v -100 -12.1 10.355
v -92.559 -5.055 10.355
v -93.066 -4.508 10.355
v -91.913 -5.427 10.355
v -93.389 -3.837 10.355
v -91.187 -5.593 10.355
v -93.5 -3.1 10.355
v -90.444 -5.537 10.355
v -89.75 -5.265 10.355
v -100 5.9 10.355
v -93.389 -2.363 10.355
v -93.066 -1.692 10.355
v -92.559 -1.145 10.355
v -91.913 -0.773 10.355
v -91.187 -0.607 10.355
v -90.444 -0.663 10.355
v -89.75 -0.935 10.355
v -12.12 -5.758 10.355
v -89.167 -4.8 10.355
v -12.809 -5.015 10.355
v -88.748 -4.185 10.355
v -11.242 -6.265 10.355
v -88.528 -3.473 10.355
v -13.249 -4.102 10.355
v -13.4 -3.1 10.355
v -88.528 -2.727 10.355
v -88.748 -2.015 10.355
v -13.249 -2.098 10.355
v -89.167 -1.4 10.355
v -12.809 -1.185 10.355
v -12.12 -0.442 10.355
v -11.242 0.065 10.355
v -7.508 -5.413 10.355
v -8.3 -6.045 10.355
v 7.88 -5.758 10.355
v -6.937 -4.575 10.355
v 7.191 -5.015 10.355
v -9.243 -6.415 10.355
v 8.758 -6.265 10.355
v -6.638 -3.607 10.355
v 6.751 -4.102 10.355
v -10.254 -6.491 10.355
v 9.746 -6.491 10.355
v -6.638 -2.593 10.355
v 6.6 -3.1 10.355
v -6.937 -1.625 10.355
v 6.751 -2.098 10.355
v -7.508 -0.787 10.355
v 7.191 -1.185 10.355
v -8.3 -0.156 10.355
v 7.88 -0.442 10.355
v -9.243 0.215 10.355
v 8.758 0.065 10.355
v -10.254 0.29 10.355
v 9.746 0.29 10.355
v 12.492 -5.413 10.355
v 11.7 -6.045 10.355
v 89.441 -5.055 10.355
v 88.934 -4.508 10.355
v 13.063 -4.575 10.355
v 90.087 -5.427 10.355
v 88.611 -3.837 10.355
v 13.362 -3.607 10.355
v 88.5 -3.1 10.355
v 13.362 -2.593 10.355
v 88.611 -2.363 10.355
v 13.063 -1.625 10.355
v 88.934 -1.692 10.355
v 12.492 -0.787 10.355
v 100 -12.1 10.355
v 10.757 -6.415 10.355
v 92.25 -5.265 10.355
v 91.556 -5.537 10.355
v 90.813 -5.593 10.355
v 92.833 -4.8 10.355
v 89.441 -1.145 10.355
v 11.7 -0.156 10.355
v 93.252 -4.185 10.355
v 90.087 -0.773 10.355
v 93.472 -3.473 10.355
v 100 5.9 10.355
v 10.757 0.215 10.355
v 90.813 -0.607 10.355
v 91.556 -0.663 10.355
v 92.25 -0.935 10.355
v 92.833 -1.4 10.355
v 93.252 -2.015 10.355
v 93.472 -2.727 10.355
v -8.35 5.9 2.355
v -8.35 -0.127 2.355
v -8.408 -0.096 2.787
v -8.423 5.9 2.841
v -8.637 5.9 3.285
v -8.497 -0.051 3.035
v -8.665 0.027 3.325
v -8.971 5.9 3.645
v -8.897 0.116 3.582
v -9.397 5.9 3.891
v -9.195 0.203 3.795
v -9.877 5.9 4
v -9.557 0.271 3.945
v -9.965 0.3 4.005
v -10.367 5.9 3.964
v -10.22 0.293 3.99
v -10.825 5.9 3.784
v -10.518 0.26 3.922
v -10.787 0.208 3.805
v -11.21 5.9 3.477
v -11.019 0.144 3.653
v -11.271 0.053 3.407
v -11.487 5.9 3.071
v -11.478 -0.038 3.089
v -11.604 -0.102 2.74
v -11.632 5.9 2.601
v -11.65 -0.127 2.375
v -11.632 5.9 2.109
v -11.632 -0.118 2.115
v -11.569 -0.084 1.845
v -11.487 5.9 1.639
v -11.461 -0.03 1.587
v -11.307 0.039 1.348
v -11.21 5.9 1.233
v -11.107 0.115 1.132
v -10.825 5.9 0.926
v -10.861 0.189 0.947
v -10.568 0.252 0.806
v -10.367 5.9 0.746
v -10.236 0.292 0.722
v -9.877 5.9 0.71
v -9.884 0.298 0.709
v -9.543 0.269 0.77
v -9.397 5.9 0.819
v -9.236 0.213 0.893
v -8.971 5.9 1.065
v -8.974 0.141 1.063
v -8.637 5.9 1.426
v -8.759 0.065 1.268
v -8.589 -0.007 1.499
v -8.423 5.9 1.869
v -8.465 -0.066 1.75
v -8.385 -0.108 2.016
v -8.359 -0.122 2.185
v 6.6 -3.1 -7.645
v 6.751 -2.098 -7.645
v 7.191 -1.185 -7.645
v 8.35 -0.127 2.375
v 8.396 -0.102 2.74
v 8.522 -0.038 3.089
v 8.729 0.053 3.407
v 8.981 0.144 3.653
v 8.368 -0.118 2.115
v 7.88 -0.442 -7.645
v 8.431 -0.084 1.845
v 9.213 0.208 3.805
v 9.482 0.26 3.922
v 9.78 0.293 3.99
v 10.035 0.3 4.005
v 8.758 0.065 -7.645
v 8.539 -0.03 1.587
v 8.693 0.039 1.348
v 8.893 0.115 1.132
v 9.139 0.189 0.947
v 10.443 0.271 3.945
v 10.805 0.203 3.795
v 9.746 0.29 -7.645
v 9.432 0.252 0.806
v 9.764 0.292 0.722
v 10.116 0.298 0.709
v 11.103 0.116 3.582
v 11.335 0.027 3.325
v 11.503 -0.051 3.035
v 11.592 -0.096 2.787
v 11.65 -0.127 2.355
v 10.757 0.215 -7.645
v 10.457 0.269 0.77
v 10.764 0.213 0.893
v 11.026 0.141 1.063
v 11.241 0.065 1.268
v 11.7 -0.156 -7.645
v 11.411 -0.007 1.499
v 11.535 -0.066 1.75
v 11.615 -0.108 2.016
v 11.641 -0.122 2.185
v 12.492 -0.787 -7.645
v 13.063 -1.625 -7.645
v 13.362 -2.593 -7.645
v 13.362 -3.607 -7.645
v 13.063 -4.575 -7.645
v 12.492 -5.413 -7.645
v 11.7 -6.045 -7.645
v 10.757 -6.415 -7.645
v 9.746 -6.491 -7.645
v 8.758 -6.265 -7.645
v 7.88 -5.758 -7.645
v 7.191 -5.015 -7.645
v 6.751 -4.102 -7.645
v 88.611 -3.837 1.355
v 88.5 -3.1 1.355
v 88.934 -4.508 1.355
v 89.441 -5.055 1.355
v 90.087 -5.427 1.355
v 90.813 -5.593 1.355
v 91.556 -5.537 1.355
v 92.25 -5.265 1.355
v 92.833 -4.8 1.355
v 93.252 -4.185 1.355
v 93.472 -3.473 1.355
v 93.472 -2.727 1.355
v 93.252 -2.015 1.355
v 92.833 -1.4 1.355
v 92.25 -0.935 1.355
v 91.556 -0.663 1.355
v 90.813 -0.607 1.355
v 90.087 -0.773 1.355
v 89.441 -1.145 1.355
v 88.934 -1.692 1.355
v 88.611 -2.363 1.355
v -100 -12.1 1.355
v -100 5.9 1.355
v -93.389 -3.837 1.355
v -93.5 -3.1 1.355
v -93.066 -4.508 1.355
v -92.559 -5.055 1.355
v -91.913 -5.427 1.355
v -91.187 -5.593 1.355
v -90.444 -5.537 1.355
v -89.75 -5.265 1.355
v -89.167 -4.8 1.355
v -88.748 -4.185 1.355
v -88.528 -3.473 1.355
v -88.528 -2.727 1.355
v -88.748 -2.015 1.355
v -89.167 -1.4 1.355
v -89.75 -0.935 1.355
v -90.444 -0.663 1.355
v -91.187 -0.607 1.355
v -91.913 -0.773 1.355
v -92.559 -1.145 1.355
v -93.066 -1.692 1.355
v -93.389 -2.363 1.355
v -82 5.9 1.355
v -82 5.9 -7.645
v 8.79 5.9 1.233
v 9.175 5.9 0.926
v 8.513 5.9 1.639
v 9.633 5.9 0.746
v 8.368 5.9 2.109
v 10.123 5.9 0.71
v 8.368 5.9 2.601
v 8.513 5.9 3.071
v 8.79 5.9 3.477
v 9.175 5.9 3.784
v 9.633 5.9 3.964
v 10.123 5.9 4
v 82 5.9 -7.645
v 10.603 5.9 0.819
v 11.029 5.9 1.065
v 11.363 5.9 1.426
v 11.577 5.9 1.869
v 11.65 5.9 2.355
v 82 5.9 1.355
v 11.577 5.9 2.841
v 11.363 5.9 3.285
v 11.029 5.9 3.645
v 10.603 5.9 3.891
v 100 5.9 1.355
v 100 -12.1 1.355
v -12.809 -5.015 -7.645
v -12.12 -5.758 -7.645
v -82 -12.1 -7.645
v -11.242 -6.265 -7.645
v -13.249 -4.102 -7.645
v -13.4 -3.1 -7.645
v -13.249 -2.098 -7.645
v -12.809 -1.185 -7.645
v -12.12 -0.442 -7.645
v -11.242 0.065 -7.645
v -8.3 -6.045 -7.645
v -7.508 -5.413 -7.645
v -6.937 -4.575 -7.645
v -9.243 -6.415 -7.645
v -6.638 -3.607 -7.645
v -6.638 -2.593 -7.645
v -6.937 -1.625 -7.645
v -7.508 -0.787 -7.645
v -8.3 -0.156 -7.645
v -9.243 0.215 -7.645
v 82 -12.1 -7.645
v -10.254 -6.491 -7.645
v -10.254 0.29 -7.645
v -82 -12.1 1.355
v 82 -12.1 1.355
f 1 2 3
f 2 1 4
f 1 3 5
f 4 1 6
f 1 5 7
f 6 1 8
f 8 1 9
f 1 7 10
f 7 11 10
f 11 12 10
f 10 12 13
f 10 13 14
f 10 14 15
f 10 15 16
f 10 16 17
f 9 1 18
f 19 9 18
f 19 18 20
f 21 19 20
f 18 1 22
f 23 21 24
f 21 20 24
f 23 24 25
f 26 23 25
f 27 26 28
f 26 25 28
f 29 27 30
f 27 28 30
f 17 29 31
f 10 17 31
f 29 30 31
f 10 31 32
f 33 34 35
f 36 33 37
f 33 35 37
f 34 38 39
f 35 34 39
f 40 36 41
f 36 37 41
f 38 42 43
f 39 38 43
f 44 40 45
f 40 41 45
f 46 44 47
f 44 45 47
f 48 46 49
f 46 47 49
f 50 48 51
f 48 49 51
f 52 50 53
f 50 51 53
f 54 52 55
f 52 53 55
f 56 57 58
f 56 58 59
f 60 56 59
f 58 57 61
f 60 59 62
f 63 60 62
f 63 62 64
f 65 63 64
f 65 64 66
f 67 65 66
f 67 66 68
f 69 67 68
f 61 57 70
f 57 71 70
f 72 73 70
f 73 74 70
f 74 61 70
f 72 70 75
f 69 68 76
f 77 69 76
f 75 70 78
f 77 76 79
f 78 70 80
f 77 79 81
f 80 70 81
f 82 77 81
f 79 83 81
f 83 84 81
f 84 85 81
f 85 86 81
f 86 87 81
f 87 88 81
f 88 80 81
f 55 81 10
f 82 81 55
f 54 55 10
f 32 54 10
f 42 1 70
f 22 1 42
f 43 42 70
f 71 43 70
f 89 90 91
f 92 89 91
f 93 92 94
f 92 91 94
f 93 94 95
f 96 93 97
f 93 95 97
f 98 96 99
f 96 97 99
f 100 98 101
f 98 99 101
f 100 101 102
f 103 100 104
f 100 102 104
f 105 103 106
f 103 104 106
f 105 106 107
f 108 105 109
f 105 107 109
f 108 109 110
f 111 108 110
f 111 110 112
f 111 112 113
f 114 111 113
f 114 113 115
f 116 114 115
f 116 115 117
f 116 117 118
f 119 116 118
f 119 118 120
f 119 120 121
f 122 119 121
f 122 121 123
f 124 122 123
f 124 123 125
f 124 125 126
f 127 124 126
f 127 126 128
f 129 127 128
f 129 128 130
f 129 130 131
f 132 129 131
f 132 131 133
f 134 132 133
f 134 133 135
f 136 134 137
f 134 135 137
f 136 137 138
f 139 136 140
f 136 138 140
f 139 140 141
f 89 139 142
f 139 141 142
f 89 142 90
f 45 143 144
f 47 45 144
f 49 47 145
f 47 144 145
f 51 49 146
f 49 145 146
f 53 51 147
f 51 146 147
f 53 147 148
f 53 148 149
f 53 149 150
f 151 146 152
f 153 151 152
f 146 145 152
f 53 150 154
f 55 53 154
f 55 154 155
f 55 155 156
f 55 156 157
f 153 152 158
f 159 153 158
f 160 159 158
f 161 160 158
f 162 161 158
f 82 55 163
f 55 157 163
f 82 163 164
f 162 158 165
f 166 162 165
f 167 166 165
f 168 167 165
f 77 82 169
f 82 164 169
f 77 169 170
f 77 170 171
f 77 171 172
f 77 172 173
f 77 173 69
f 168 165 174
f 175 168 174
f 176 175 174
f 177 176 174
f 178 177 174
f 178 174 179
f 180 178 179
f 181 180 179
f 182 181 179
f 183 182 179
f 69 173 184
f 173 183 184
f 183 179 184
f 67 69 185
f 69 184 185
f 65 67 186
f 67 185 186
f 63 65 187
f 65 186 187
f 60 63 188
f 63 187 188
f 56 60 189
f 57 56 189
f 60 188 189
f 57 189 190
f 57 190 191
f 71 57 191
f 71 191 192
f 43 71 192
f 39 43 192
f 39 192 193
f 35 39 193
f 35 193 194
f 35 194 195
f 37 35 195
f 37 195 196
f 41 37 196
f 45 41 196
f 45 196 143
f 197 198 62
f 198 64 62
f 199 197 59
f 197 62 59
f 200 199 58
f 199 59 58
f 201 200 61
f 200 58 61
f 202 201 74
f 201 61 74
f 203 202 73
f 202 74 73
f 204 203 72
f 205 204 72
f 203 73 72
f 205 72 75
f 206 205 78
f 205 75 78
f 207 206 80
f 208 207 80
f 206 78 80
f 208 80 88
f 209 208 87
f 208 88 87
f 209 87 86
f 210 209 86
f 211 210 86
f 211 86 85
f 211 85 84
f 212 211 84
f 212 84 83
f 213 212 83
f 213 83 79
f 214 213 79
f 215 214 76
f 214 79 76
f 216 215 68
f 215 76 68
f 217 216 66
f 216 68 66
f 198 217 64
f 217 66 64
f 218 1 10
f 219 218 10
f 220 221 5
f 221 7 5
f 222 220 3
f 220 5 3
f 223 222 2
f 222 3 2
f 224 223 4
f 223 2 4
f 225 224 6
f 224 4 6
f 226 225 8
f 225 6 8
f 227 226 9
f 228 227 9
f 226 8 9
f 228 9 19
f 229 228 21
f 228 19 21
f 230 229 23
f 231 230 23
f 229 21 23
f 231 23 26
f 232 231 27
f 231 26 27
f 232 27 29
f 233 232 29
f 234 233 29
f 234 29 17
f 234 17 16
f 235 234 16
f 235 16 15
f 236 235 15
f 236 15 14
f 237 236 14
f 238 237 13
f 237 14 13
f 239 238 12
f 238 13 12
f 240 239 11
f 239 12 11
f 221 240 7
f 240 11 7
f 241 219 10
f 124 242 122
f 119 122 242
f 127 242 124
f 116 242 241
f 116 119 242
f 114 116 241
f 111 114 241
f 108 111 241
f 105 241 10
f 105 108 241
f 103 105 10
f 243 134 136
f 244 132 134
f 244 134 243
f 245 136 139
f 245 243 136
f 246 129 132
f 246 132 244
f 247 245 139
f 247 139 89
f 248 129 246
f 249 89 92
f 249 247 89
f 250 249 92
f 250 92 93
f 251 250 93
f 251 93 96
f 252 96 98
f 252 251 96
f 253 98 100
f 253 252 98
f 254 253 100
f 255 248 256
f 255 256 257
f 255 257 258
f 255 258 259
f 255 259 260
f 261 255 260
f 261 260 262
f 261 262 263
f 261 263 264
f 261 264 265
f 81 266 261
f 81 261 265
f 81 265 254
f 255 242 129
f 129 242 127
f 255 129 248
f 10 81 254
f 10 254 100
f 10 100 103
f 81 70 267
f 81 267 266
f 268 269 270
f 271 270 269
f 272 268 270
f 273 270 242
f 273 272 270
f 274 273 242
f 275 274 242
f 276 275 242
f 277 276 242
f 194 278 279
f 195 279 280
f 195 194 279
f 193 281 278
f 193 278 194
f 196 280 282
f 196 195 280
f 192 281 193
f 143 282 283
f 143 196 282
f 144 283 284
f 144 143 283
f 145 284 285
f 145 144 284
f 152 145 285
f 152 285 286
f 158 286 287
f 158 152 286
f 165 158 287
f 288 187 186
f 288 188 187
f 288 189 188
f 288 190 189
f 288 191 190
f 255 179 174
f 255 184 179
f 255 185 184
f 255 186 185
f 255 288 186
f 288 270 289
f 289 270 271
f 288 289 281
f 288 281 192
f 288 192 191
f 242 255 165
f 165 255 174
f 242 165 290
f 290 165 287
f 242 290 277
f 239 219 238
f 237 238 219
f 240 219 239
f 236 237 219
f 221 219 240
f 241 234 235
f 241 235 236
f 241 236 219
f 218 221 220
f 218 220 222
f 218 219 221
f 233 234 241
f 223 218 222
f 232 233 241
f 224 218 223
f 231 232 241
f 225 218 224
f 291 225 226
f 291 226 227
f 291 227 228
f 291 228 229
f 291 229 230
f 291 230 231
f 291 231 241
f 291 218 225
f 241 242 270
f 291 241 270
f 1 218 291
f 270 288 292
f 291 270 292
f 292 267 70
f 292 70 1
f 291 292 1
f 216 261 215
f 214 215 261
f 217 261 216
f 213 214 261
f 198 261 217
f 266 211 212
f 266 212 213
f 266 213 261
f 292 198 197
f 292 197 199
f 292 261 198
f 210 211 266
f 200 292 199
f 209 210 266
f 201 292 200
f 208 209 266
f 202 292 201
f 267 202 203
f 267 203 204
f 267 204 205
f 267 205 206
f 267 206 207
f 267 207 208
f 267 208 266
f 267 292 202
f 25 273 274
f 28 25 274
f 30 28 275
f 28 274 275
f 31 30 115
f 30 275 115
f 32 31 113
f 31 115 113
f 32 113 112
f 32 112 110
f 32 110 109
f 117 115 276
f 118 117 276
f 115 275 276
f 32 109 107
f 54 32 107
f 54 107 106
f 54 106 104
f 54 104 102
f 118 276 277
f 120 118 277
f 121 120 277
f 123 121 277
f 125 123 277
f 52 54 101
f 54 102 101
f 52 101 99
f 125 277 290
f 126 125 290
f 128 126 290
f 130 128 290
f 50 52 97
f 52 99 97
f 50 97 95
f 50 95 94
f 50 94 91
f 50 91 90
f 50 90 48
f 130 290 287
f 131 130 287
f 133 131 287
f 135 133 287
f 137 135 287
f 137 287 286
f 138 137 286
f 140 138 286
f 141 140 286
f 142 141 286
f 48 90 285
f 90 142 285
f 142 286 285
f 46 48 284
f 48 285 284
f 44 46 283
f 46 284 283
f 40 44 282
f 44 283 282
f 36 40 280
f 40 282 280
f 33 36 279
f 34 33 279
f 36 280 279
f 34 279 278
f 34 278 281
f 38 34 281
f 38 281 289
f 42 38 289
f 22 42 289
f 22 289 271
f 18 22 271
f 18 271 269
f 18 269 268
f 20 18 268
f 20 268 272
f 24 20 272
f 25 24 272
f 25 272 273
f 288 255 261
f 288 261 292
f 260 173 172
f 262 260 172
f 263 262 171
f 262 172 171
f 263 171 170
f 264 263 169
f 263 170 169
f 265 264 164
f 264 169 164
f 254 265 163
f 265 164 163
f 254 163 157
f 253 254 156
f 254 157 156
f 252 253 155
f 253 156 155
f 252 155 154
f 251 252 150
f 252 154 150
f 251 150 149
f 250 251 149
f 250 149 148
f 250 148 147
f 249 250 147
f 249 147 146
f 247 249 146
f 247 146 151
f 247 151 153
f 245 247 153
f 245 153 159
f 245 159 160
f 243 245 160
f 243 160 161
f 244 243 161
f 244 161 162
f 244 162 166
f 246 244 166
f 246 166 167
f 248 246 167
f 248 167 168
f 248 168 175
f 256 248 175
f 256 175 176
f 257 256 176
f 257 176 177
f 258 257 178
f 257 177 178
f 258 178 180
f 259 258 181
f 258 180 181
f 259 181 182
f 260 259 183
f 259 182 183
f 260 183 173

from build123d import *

# Parameters (mm, degrees)
F0_W     = 18
F0_H     = 18
F1_DEPTH = 100
F3_D     = 6.8
F5_D     = 3.3
F5_DEPTH = 8
F5_TIP   = 0.9914200214
F8_D     = 5
F8_DEPTH = 18
F8_TIP   = 1.5021515476
F7_W     = 18
F7_H     = 18
F9_DEPTH = 9


with BuildPart() as f1:
    # F0 (on Right) → F1 (new body, symmetric)
    with BuildSketch(Plane.YZ):
        with Locations((-3.1000529416, 1.3550933172)):
            Rectangle(F0_W, F0_H)
    extrude(amount=F1_DEPTH, both=True)

    # F3 (through all)
    with Locations(Plane.XY.offset(10.3550933172)):
        with Locations((-10, -3.1000529416), (10, -3.1000529416)):
            Hole(F3_D / 2)

    # F5
    with Locations(Plane(origin=(0, 5.8999470584, 0), x_dir=(-1, 0, 0), z_dir=(0, 1, 0))):
        with Locations((-10, 2.3550933172), (10, 2.3550933172)):
            Hole(F5_D / 2, depth=F5_DEPTH)
            with Locations((0, 0, -(F5_DEPTH + F5_TIP / 2))):  # 118° drill point
                Cone(0, F5_D / 2, F5_TIP, mode=Mode.SUBTRACT)

    # F8
    with Locations(Plane(origin=(0, 0, -7.6449066828), x_dir=(1, 0, 0), z_dir=(0, 0, -1))):
        with Locations((91, 3.1000529416), (-91, 3.1000529416)):
            Hole(F8_D / 2, depth=F8_DEPTH)
            with Locations((0, 0, -(F8_DEPTH + F8_TIP / 2))):  # 118° drill point
                Cone(0, F8_D / 2, F8_TIP, mode=Mode.SUBTRACT)

    # F7 (on face) → F9 (cut)
    with BuildSketch(Plane(origin=(0, 0, -7.6449066828), x_dir=(1, 0, 0), z_dir=(0, 0, -1))):
        with Locations((-91, 3.1000529416)):
            Rectangle(F7_W, F7_H)
        with Locations((91, 3.1000529416)):
            Rectangle(F7_W, F7_H)
    extrude(amount=-F9_DEPTH, mode=Mode.SUBTRACT)


solid = f1.part
